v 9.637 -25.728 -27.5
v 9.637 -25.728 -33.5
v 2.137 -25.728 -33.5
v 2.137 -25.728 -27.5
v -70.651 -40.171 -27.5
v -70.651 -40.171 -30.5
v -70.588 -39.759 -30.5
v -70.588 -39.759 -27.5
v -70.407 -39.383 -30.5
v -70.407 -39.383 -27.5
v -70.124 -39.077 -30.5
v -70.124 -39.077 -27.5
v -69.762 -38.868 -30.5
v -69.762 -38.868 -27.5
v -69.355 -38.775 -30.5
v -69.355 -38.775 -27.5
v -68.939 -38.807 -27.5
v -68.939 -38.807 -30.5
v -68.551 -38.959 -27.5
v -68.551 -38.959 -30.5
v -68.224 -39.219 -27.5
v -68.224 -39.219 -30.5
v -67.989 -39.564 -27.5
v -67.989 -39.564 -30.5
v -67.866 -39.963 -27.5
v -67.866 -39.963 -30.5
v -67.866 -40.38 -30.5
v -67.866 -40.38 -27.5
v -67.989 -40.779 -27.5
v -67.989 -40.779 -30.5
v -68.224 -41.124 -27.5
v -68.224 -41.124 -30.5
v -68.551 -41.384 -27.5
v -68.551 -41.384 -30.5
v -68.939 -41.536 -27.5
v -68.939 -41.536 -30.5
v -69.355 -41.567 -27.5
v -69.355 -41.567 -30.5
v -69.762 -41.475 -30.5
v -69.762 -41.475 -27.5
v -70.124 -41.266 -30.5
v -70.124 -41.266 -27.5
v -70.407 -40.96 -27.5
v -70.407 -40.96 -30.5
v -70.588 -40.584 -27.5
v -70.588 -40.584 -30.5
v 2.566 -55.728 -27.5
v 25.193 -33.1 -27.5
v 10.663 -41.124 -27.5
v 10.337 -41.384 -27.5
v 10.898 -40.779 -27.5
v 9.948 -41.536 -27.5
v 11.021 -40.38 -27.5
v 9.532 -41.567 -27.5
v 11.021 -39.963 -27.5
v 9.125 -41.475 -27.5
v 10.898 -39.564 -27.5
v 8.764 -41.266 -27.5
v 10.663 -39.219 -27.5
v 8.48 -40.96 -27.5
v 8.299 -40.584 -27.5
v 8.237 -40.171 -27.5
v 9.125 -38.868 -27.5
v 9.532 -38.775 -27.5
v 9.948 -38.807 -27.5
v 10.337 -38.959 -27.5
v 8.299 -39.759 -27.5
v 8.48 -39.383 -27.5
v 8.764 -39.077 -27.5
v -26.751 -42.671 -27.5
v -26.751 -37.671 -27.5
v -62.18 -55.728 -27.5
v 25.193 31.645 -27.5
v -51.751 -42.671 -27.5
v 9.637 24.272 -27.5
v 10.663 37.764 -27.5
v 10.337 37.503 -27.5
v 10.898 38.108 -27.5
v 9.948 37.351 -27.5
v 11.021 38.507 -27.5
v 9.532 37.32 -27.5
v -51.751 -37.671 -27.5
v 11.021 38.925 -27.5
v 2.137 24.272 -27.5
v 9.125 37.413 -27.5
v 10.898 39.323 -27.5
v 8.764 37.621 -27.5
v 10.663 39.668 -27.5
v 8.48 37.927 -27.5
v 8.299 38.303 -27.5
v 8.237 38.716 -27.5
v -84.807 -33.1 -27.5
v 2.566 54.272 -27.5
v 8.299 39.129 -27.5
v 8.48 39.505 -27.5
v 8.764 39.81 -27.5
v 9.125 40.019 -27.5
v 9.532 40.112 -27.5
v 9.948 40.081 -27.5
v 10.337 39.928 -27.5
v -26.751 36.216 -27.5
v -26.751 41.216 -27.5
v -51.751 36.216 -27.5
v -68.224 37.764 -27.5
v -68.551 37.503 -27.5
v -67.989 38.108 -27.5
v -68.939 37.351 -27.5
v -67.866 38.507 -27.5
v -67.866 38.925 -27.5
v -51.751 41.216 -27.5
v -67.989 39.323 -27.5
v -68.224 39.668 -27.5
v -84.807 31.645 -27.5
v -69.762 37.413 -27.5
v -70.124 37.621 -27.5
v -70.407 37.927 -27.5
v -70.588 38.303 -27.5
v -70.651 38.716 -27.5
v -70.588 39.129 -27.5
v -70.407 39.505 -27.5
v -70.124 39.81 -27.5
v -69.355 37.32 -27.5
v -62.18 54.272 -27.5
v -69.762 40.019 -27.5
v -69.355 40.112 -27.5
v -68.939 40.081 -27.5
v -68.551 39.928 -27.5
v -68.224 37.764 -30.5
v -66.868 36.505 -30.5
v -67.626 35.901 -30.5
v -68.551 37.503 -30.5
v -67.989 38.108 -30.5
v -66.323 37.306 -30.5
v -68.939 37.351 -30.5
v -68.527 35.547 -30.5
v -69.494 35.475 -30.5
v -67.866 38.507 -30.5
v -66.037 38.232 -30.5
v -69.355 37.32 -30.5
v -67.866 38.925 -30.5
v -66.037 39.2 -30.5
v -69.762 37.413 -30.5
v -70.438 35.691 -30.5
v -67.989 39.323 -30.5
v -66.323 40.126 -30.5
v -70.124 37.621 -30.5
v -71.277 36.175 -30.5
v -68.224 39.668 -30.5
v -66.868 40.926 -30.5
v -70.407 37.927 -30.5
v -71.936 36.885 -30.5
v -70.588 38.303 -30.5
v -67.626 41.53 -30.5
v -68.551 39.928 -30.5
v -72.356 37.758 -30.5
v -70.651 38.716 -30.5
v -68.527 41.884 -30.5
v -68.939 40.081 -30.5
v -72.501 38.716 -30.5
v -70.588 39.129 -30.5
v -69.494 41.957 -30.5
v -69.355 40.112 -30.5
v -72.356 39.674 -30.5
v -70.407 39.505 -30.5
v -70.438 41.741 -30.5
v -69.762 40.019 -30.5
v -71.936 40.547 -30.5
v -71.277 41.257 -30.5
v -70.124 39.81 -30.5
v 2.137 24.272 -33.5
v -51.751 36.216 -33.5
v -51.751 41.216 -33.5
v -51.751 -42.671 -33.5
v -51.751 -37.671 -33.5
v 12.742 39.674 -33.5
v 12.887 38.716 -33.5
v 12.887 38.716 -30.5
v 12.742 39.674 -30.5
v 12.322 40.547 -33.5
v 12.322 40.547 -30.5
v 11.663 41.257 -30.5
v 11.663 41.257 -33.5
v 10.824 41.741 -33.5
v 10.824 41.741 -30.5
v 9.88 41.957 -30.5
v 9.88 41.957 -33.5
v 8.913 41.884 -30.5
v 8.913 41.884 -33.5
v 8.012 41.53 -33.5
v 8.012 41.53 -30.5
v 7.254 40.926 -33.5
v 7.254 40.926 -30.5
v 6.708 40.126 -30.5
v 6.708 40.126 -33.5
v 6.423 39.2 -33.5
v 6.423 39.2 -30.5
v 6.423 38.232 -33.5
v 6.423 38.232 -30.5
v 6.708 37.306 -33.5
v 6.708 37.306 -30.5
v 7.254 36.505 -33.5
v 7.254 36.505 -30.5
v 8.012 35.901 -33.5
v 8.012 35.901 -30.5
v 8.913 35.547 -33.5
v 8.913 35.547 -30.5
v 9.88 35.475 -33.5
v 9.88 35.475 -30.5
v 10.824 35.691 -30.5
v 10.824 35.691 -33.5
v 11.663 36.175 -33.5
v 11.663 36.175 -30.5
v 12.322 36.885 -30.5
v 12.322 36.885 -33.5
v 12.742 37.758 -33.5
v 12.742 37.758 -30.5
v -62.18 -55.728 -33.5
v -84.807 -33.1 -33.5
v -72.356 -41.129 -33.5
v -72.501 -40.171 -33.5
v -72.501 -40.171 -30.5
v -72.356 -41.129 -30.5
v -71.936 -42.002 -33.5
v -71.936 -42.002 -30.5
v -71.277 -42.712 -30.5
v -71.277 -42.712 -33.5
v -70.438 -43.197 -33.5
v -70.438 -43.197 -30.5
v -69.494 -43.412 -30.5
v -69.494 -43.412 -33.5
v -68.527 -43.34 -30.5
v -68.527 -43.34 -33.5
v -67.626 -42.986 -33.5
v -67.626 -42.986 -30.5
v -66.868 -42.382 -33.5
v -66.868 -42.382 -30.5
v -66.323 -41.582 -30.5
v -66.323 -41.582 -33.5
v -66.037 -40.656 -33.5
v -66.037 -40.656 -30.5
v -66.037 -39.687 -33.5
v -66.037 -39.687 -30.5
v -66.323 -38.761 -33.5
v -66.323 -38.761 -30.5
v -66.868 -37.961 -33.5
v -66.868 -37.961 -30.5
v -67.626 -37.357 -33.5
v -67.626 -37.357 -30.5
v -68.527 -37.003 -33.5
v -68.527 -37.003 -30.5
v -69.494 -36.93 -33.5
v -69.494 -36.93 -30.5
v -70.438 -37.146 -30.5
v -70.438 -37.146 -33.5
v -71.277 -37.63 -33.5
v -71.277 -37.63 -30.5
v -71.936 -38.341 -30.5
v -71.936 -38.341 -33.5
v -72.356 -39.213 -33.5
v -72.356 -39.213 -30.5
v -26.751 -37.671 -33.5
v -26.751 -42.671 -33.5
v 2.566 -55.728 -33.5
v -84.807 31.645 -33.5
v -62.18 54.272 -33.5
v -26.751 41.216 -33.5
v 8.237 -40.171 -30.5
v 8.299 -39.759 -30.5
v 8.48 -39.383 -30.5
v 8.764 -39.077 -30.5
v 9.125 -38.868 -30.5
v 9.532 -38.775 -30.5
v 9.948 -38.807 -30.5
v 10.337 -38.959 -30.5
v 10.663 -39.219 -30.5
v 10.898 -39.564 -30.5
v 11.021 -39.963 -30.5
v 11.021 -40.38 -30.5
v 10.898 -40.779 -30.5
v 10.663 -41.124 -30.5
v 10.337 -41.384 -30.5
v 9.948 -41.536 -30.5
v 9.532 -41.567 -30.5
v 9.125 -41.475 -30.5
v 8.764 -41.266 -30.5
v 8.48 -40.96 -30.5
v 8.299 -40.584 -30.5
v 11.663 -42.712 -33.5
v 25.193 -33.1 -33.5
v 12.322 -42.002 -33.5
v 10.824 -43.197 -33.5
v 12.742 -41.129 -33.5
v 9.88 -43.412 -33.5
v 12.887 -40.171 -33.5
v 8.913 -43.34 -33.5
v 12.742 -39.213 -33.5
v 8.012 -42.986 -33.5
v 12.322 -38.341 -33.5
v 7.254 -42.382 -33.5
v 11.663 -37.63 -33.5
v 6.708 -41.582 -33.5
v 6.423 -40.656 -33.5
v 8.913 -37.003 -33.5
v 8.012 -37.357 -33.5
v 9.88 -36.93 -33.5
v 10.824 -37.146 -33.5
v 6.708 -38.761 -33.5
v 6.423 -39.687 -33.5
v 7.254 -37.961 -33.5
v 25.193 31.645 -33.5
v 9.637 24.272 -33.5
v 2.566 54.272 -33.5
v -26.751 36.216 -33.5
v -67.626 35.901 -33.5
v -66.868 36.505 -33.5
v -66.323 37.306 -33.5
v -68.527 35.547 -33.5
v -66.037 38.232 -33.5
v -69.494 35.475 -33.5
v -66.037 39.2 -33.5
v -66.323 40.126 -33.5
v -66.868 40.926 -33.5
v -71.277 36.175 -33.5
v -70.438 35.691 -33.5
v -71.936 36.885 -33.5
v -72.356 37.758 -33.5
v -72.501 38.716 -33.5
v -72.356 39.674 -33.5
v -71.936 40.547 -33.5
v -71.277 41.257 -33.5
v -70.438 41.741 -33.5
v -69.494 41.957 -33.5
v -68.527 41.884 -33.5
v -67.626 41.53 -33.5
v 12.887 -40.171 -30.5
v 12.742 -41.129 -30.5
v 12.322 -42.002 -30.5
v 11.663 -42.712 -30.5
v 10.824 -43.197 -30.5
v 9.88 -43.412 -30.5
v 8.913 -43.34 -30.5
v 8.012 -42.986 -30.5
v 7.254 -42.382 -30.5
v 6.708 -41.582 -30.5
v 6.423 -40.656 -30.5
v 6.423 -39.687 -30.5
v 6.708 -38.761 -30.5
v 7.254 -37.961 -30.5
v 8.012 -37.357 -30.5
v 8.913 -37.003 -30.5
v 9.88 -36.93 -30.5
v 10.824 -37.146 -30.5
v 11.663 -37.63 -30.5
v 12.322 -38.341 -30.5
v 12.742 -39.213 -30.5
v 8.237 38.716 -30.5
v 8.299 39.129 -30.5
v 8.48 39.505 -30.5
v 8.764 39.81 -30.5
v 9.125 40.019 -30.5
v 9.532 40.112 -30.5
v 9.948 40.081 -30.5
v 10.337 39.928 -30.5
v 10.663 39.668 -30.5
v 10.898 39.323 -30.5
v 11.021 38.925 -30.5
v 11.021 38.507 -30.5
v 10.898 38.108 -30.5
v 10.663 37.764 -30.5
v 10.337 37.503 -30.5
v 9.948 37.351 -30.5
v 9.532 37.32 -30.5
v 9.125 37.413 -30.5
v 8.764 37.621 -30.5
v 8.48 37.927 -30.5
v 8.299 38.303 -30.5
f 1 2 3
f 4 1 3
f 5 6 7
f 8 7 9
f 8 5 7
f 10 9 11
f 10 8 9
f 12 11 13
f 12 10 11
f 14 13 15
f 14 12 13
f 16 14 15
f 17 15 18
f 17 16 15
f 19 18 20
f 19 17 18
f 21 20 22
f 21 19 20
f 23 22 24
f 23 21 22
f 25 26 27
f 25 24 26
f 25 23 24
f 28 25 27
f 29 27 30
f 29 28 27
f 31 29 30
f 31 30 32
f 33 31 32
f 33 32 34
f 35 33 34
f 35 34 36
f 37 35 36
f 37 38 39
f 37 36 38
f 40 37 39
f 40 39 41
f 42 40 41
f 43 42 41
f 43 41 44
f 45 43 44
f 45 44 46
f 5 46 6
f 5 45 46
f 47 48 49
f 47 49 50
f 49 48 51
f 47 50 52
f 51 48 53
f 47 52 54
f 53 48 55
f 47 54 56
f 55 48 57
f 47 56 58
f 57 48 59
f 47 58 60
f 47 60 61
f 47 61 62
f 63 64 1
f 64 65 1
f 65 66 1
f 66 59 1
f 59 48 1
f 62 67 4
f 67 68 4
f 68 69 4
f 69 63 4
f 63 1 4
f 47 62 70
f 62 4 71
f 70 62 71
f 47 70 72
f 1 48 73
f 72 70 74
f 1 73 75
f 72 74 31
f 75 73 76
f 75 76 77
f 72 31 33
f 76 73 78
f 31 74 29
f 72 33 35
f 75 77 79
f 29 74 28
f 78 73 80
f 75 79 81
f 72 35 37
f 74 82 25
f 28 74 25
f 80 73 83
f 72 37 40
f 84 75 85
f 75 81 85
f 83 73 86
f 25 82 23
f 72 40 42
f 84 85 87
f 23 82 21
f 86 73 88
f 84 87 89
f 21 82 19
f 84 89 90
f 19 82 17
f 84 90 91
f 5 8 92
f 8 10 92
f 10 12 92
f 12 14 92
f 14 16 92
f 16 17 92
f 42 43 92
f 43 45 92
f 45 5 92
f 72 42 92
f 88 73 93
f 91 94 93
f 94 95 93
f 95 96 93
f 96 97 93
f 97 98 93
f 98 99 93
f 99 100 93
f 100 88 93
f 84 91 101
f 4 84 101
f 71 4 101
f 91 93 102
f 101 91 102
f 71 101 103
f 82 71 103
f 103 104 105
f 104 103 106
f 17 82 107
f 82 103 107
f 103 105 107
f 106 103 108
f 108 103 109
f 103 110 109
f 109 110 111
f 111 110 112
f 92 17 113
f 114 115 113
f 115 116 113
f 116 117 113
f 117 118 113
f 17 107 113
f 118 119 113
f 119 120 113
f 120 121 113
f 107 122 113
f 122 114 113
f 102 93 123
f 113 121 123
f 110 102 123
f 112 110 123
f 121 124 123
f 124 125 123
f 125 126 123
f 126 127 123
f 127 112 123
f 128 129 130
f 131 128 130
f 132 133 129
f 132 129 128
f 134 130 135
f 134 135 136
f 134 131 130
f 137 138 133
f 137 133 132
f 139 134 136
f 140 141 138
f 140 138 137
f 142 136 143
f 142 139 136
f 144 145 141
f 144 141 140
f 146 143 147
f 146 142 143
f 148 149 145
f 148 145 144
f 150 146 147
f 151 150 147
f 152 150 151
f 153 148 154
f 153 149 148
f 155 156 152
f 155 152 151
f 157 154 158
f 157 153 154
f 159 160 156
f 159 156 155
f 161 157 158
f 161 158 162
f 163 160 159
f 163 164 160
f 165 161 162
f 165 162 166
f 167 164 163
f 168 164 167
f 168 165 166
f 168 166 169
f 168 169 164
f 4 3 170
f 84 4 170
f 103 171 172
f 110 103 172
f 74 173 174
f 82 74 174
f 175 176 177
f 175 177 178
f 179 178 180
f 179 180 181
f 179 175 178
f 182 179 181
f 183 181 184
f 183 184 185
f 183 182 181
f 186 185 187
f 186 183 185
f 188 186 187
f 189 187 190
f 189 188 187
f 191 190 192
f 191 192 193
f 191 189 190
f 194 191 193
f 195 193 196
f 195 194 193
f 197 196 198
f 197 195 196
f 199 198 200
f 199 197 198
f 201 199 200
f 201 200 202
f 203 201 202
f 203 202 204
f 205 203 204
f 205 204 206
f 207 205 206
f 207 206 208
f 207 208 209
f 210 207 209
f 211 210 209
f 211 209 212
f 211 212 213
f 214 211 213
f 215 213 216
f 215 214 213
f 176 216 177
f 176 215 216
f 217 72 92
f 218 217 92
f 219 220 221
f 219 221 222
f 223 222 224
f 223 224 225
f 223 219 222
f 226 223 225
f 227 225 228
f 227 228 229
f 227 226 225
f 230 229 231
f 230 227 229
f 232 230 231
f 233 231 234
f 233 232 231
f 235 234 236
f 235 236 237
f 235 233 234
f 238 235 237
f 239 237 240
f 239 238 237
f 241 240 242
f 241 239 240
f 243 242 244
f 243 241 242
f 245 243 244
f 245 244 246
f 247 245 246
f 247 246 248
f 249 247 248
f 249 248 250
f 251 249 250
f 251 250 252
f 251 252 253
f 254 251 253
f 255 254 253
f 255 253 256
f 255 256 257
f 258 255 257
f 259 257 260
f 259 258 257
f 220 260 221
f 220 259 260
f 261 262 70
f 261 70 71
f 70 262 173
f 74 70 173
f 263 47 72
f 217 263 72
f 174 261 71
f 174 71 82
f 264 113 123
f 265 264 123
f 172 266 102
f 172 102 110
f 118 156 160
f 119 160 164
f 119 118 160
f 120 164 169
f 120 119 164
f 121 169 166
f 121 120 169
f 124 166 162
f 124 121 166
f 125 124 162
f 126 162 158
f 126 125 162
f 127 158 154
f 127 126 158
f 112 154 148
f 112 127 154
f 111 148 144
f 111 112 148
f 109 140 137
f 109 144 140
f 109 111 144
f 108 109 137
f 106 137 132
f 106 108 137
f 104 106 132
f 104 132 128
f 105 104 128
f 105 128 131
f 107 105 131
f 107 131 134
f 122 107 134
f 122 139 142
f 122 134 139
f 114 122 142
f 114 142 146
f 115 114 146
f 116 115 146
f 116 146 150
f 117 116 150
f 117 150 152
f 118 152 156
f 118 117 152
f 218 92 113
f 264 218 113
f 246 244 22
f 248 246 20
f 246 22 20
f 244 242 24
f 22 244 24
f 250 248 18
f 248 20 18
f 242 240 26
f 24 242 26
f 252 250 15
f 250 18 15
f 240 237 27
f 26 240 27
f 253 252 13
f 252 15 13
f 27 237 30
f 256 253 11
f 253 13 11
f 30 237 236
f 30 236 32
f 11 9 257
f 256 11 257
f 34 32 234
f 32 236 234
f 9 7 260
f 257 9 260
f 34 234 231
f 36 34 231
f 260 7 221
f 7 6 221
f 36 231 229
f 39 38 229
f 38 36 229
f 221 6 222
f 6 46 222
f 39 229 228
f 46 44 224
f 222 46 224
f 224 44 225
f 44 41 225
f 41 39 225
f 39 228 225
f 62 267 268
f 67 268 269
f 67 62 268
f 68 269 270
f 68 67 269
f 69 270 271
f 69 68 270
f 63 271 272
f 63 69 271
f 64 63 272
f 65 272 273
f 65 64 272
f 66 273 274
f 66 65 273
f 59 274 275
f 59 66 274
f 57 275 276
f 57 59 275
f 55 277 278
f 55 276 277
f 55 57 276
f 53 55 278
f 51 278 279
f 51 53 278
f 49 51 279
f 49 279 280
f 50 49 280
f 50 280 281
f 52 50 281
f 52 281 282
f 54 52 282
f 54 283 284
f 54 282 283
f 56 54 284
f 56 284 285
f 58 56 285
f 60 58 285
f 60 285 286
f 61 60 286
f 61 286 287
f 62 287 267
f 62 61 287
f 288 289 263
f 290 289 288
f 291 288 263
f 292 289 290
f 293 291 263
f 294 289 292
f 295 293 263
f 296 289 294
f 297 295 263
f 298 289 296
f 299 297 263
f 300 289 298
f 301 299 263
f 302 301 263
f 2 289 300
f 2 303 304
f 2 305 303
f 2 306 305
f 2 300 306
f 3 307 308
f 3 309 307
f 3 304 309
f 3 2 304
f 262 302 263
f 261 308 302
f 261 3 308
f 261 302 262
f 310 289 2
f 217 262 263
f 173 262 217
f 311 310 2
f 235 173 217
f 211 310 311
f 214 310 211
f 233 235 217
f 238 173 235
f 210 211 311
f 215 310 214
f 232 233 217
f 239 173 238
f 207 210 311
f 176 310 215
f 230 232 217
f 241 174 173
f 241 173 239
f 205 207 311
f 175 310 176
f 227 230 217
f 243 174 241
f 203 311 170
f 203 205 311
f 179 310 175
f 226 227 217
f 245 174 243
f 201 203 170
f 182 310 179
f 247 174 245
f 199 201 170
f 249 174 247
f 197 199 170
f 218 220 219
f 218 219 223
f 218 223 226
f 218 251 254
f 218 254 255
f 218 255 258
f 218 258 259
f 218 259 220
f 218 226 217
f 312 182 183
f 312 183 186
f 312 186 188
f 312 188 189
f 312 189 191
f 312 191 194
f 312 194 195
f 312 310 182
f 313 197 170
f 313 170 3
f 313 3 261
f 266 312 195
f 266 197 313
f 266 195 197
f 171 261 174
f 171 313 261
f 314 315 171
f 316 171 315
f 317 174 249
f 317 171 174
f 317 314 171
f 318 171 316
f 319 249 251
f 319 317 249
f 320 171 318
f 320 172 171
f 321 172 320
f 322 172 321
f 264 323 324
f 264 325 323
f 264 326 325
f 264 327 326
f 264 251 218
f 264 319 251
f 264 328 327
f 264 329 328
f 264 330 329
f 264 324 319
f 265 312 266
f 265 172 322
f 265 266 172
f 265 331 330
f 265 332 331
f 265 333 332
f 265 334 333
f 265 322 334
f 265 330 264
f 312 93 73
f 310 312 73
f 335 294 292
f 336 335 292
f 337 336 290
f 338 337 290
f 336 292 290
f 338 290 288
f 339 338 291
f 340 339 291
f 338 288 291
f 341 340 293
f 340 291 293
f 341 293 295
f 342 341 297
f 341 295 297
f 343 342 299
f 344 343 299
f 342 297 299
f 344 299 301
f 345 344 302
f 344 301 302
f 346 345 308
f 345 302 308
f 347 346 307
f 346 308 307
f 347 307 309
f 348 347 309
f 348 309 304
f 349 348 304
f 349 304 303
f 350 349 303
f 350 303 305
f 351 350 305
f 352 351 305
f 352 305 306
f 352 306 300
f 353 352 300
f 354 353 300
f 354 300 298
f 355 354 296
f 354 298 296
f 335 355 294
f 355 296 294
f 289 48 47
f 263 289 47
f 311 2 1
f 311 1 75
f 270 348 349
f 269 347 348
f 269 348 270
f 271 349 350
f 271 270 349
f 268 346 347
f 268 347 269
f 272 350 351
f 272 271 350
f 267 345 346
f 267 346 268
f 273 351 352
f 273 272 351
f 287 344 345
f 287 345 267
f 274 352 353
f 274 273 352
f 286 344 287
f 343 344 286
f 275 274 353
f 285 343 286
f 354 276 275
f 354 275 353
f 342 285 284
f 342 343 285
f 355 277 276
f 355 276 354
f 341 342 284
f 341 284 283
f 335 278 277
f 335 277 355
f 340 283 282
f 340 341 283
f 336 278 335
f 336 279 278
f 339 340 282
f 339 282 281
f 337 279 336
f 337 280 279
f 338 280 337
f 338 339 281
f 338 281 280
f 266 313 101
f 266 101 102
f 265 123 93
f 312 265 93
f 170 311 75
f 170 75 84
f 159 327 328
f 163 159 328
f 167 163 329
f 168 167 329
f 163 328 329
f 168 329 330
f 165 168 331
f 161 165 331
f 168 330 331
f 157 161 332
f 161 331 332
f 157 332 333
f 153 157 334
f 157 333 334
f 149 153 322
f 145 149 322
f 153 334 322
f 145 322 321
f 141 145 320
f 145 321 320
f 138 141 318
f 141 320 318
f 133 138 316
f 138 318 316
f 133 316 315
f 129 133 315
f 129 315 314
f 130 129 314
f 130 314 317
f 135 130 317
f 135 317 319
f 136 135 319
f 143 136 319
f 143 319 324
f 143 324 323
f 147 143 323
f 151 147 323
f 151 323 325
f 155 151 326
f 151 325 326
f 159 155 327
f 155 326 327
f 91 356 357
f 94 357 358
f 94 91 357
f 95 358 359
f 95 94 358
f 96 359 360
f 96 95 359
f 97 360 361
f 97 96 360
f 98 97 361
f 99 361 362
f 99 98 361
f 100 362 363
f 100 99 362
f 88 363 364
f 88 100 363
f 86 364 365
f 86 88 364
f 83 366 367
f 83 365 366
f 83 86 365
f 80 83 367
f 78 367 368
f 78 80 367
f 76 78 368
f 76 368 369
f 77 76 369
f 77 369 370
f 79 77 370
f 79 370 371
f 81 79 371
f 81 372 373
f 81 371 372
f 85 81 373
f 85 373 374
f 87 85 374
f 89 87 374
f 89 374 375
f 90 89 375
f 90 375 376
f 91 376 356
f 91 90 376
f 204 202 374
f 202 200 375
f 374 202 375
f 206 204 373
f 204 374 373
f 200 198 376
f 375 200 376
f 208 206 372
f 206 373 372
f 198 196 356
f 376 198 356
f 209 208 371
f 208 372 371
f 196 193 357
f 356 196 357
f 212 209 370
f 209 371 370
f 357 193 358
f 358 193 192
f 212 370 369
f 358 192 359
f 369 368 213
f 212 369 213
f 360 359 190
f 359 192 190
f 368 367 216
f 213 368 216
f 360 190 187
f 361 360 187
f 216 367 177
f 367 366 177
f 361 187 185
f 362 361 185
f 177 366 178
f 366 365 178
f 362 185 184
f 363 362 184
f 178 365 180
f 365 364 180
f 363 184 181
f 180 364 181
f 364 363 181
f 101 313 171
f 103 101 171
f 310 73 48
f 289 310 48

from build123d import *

# Parameters (mm, degrees)
ESQUISSE1_R                                = 1.4
BOSS_EXTRU_1_DEPTH                         = 6
ESQUISSE2_R                                = 3.25
ENL_V_MAT_EXTRU_1_DEPTH                    = 3
SYM_TRIE3_AT_THE_SECOND_PLANE_COPY_1_SKE_R = 3.25
SYM_TRIE3_AT_THE_SECOND_PLANE_COPY_1_DEPTH = 3
ESQUISSE4_W                                = 25
ESQUISSE4_H                                = 5
ESQUISSE4_W_2                              = 7.5
ESQUISSE4_H_2                              = 50
ENL_V_MAT_EXTRU_2_DEPTH                    = 102.655363655


with BuildPart() as part:
    # Esquisse1 → Boss.-Extru.1 (new body)
    with BuildSketch(Plane(origin=(0, 0, -27.5), x_dir=(-1, 0, 0), z_dir=(0, 0, -1))):
        Polygon((-2.565563678, -55.727752809), (62.179602326, -55.727752809), (84.807019324, -33.100335811), (84.807019324, 31.644830193), (62.179602326, 54.272247191), (-2.565563678, 54.272247191), (-25.192980676, 31.644830193), (-25.192980676, -33.100335811), align=None)
        with Locations((-9.63663149, 38.715898005)):
            Circle(ESQUISSE1_R, mode=Mode.SUBTRACT)
        with Locations((69.250670138, 38.715898005)):
            Circle(ESQUISSE1_R, mode=Mode.SUBTRACT)
        with Locations((69.250670138, -40.171403623)):
            Circle(ESQUISSE1_R, mode=Mode.SUBTRACT)
        with Locations((-9.63663149, -40.171403623)):
            Circle(ESQUISSE1_R, mode=Mode.SUBTRACT)
    extrude(amount=BOSS_EXTRU_1_DEPTH)

    # Esquisse2 → Enlèv. mat.-Extru.1 (cut)
    with BuildSketch(Plane(origin=(0, 0, -33.5), x_dir=(-1, 0, 0), z_dir=(0, 0, -1))):
        with Locations((69.250670138, 38.715898005)):
            Circle(ESQUISSE2_R)
    enl_v_mat_extru_1 = extrude(amount=-ENL_V_MAT_EXTRU_1_DEPTH, mode=Mode.SUBTRACT)

    # Symétrie3: Enlèv. mat.-Extru.1 across plane
    add(enl_v_mat_extru_1.mirror(Plane(origin=(-29.807019324, 0, 0), x_dir=(0, 0, 1), z_dir=(1, 0, 0))), mode=Mode.SUBTRACT)

    # Symétrie3 at the second plane: Enlèv. mat.-Extru.1 across plane
    add(enl_v_mat_extru_1.mirror(Plane(origin=(0, -0.727752809, 0), x_dir=(0, 0, 1), z_dir=(0, -1, 0))), mode=Mode.SUBTRACT)

    # Symétrie3 at the second plane copy 1 ske → Symétrie3 at the second plane copy 1 (cut)
    with BuildSketch(Plane(origin=(-59.614038648, -1.455505618, -33.5), x_dir=(1, 0, 0), z_dir=(0, 0, -1))):
        with Locations((69.250670138, 38.715898005)):
            Circle(SYM_TRIE3_AT_THE_SECOND_PLANE_COPY_1_SKE_R)
    extrude(amount=-SYM_TRIE3_AT_THE_SECOND_PLANE_COPY_1_DEPTH, mode=Mode.SUBTRACT)

    # Esquisse4 → Enlèv. mat.-Extru.2 (cut, through all)
    with BuildSketch(Plane(origin=(0, 0, -33.5), x_dir=(-1, 0, 0), z_dir=(0, 0, -1))):
        with Locations((39.250670138, -40.171403623)):
            Rectangle(ESQUISSE4_W, ESQUISSE4_H)
        with Locations((39.250670138, 38.715898005)):
            Rectangle(ESQUISSE4_W, ESQUISSE4_H)
        with Locations((-5.88663149, -0.727752809)):
            Rectangle(ESQUISSE4_W_2, ESQUISSE4_H_2)
    extrude(amount=-ENL_V_MAT_EXTRU_2_DEPTH, mode=Mode.SUBTRACT)


solid = part.part
